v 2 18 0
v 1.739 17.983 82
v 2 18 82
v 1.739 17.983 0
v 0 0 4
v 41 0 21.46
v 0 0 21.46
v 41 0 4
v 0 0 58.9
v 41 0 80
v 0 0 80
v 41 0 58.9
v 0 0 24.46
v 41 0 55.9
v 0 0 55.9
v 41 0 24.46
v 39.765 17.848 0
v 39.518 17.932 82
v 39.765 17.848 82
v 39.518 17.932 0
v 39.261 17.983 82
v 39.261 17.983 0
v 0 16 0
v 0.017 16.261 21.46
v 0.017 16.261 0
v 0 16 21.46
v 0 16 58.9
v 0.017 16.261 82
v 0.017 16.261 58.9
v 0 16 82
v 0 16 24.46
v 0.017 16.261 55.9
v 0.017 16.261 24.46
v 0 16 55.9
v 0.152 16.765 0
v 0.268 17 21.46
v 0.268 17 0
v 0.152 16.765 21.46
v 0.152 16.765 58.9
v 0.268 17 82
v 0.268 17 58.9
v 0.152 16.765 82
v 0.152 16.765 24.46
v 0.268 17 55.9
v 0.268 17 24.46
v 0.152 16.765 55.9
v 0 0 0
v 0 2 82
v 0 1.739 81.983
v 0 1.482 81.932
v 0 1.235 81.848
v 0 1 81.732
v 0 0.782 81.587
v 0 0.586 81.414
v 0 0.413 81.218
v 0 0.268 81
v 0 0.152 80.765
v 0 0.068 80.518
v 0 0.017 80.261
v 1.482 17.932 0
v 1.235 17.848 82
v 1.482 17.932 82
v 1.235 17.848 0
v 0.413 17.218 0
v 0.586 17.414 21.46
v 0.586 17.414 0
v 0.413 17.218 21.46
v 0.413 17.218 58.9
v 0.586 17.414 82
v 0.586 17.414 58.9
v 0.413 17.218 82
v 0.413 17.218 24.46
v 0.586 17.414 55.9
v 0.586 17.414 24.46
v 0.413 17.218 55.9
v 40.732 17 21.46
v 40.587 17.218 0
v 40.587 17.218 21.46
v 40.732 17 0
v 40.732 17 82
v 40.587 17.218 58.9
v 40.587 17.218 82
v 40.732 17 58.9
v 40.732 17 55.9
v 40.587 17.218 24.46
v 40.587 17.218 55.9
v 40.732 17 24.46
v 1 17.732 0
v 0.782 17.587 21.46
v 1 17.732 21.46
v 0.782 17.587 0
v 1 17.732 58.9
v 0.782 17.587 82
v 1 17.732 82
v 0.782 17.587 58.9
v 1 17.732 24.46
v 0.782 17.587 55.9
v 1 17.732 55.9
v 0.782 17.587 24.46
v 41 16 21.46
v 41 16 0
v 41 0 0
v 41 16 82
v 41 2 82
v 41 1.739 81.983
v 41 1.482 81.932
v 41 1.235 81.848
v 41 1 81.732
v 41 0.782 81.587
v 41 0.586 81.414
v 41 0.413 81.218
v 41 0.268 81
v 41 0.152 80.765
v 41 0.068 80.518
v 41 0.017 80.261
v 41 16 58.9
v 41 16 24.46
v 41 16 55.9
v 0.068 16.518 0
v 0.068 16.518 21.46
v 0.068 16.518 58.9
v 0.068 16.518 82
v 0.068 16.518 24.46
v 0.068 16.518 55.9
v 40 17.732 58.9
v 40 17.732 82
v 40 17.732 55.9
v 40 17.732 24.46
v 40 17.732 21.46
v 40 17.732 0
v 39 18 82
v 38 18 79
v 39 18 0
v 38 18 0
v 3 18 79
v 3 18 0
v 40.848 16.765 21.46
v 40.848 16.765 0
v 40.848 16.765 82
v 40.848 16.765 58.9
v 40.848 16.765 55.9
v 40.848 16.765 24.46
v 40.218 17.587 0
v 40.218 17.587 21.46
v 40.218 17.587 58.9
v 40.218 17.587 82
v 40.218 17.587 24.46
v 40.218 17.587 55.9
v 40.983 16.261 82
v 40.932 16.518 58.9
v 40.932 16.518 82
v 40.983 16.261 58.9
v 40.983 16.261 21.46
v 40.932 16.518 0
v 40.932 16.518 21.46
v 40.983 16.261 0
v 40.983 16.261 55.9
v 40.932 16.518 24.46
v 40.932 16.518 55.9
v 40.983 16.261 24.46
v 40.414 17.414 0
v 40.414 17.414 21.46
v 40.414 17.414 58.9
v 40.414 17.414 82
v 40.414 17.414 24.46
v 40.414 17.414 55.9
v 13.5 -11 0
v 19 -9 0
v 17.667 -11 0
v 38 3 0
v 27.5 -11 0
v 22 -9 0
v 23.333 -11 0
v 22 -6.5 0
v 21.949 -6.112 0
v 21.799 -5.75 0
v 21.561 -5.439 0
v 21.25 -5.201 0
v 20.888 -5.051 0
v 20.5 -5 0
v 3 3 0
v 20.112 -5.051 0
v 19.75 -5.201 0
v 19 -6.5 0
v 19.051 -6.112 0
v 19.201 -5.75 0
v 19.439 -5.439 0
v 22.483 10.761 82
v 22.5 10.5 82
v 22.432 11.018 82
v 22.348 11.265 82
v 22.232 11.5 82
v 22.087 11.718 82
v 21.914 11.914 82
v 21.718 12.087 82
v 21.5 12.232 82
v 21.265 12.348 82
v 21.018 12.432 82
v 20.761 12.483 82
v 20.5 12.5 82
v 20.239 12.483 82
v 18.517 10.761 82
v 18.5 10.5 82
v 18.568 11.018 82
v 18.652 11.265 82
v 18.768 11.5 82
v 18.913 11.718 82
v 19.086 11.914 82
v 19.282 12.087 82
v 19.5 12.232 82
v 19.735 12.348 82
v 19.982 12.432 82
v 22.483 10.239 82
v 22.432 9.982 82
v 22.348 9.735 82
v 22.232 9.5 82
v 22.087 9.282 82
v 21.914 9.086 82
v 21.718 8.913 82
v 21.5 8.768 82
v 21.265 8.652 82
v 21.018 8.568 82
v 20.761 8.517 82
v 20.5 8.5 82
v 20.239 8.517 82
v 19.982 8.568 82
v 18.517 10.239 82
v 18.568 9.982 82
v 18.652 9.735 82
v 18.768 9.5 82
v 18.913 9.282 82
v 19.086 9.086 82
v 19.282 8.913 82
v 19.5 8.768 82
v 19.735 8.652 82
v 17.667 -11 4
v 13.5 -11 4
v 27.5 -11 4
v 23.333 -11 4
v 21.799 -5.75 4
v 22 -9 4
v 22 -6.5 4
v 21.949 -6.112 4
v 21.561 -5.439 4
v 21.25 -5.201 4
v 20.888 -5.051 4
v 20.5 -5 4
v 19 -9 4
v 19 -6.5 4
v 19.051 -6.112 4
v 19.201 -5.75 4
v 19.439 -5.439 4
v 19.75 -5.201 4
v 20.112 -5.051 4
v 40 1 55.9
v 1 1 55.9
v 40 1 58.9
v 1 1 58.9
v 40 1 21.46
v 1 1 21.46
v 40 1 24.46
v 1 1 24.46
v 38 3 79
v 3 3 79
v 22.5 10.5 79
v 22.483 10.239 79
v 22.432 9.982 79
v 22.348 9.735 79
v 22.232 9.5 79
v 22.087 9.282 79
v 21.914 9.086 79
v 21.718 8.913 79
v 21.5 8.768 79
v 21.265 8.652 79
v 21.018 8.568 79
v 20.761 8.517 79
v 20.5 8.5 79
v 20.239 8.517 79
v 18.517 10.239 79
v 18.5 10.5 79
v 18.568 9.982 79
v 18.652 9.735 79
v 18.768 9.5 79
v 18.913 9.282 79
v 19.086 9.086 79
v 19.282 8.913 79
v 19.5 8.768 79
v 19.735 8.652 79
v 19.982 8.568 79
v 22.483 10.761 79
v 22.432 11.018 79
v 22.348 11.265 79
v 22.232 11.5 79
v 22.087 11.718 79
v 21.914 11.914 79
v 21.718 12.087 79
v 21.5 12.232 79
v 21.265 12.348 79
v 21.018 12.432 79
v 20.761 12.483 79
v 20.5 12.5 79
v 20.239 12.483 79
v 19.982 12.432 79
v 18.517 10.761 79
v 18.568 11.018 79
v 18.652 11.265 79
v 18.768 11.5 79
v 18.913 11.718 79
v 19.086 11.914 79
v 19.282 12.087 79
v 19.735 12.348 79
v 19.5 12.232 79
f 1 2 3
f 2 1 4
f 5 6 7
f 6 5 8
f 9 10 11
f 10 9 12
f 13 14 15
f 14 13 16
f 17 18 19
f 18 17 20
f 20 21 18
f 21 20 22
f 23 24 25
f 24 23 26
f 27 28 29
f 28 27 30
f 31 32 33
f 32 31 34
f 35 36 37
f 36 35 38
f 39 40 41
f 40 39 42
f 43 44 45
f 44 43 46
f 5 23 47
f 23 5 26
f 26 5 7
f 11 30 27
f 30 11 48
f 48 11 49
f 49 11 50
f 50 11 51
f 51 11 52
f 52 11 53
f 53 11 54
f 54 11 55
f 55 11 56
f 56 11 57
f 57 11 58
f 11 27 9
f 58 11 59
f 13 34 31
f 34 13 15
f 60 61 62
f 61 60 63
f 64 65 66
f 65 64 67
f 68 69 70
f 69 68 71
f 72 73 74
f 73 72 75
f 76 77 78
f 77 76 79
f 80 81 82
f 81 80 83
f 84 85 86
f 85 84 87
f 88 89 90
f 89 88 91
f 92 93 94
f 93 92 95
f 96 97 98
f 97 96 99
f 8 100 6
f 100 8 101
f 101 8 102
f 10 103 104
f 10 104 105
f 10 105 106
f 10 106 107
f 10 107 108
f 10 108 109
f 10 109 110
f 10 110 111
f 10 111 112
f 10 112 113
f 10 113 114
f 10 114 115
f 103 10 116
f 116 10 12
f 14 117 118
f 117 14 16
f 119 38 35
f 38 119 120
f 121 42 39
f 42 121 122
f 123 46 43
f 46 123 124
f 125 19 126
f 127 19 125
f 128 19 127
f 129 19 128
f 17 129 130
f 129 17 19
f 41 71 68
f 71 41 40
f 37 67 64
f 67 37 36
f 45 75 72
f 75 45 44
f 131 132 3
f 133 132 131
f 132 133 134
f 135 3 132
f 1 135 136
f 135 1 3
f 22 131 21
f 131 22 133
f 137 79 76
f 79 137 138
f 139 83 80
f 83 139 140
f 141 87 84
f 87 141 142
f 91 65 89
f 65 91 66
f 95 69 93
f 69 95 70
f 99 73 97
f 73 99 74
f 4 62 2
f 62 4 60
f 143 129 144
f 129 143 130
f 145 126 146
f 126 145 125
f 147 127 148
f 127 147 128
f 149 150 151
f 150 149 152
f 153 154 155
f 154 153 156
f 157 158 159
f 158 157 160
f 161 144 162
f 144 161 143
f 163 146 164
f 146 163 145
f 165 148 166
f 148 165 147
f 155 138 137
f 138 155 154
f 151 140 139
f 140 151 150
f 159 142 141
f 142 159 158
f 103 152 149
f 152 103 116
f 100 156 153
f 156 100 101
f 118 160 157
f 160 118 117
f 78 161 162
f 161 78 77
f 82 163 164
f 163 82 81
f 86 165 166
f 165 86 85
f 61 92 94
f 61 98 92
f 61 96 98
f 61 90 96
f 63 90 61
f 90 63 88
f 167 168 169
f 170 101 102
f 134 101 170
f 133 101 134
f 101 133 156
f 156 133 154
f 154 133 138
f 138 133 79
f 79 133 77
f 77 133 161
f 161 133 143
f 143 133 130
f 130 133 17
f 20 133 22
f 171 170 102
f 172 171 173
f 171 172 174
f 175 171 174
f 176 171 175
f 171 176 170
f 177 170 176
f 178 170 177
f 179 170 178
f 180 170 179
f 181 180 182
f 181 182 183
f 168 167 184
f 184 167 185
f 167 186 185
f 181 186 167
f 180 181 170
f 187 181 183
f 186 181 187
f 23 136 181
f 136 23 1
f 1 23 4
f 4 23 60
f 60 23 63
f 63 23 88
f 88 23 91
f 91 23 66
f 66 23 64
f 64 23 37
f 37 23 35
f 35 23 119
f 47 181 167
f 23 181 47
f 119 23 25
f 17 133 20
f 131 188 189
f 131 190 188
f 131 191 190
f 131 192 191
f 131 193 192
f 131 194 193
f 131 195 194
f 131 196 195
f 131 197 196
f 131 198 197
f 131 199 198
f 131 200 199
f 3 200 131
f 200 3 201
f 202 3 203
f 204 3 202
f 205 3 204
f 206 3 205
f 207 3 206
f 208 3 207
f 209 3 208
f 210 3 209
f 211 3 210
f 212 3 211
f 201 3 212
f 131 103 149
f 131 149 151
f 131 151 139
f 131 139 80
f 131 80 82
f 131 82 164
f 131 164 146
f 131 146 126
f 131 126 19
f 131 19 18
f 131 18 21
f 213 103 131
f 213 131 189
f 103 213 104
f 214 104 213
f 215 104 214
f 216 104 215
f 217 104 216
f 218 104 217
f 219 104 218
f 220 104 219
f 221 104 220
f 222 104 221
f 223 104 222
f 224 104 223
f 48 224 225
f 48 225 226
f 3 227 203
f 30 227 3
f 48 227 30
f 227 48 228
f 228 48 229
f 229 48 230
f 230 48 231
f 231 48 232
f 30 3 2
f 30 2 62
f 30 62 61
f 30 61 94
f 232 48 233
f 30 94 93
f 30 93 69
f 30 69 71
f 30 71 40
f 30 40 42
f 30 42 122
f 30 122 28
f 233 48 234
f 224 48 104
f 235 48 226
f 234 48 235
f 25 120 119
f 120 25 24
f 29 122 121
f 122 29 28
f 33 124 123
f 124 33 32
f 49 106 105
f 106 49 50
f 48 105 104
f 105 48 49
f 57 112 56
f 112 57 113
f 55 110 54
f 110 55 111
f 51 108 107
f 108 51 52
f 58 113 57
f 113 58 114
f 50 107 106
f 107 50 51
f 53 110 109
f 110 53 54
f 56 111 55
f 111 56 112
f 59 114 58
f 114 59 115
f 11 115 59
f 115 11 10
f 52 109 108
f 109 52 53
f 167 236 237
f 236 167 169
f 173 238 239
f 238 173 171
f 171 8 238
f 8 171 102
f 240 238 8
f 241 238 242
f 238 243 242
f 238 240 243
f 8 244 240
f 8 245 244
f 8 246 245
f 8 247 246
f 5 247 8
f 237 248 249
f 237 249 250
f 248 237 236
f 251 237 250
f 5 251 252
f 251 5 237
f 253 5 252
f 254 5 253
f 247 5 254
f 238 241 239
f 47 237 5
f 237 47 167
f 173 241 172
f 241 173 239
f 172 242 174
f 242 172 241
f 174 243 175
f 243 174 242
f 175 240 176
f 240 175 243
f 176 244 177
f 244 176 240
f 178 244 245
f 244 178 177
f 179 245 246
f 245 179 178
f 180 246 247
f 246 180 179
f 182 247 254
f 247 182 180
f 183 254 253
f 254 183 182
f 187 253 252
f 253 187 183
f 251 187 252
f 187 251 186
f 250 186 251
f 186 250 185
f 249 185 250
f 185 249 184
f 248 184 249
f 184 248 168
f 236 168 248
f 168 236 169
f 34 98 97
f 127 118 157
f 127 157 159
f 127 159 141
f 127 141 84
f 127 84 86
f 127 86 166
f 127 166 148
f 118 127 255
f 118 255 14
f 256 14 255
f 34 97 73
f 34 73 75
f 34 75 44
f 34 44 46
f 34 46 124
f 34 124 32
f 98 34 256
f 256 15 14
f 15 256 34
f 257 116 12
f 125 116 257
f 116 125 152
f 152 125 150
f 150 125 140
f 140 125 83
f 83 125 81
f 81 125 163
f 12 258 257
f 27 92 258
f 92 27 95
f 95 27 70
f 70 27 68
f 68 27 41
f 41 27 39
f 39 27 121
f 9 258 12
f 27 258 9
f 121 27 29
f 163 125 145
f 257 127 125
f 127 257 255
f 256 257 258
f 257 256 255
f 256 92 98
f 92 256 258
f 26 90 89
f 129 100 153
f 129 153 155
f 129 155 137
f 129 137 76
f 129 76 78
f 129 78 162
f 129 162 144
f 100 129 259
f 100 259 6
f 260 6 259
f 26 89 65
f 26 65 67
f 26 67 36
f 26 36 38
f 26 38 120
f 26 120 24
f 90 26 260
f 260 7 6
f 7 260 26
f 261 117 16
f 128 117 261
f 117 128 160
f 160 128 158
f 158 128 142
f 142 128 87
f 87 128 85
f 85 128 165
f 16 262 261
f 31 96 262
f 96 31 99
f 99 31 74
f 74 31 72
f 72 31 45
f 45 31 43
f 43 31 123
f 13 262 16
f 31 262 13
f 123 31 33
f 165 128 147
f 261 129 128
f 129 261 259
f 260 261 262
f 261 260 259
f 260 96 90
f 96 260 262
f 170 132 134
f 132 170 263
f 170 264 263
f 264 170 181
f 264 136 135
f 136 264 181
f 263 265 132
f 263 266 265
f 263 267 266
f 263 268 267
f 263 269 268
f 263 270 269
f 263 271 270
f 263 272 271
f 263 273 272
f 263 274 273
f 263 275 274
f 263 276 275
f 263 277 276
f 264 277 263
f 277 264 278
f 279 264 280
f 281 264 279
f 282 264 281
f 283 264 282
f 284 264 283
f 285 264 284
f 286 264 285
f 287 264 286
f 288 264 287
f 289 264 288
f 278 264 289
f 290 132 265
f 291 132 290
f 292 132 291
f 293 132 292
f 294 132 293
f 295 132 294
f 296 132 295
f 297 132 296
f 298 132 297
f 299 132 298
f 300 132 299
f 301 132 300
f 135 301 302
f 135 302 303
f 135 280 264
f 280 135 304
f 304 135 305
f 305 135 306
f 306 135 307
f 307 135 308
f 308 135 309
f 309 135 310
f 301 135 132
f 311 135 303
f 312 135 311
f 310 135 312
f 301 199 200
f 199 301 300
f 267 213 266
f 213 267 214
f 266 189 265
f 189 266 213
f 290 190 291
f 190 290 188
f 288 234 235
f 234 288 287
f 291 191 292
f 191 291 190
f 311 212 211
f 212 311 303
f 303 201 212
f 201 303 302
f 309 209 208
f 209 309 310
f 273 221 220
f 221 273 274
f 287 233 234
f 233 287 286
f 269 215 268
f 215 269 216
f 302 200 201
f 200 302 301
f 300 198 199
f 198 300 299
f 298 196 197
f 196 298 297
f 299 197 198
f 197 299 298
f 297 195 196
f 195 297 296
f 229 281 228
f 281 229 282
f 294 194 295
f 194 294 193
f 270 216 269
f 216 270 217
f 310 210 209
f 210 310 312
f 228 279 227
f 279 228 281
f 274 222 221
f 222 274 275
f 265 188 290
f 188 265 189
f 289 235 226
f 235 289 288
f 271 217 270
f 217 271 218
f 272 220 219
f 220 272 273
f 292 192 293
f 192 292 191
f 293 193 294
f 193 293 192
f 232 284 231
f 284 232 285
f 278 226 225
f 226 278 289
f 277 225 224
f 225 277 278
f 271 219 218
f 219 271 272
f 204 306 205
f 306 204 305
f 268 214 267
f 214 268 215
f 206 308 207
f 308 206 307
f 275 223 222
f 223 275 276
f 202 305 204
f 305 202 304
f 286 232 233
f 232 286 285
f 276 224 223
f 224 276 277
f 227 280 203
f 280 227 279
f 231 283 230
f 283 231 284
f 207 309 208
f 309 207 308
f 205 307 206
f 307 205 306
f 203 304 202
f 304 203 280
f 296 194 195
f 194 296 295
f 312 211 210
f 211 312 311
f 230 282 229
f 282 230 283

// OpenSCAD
// SPDX-License-Identifier: CERN-OHL-S-2.0
// © 2026 WeSoar, conception Alexandre Pereira
// Source : https://github.com/wesoar-fr/ws-trimmer
// ============================================================
//  Support du télémètre laser, côté voile — reprise d'un premier essai, « TEST.stl ».
//
//  Même principe : le télémètre est couché dans une auge ouverte à l'avant ; sous l'avant,
//  un bec plat descend sous le fond et porte une encoche. La suspente passe dans l'encoche,
//  sa patte d'attache, trop grosse, bute contre le bec : sous 5 kg, la suspente reste dans
//  l'axe du faisceau. Lecture du laser + constante = longueur de la suspente.
//
//  Ce qui change par rapport à TEST.stl :
//   - cotes du télémètre en paramètres : largeur, longueur, épaisseur ;
//   - parois moins hautes que le télémètre (moins_epais), pour le saisir et atteindre ses boutons ;
//   - dégagement réglable dans une paroi pour les boutons placés sur le côté ;
//   - encoche de 3 mm, entrée en V, fond rond ; deux rainures pour un élastique, trou de dragonne.
//  Le bec garde strictement la forme de TEST.stl (4 mm, rien ne dépasse derrière lui).
//
//  TODO : origine de TEST.stl à confirmer par l'auteur : s'il vient d'un tiers, citer l'auteur
//  et vérifier la compatibilité de sa licence (voir NOTES.md, « Support du laser »).
//
//  Repère : y = sens du faisceau, face arrière du support en y = 0 ; z vers le haut, dessous
//  du fond en z = 0. Le bec est à l'avant (y = len), ses faces sont perpendiculaires au faisceau.
//  S'imprime debout sur la face avant du bec, sans support.
// ============================================================

// --- Télémètre : à mesurer au pied à coulisse (valeurs reprises de TEST.stl) ---
laser_w = 34.5;    // largeur
laser_l = 78.5;    // longueur
laser_h = 18;      // épaisseur
fit     = 0.5;     // jeu en largeur et en longueur
moins_epais = 3;   // les parois s'arrêtent à cette hauteur sous le dessus du télémètre

// --- Boutons sur le côté du télémètre : la paroi est abaissée en face d'eux ---
btn_cote = 0;      // 0 : aucun ; 1 : côté droit (x grand) ; -1 : côté gauche ; 2 : les deux
btn_y0   = 20;     // début du dégagement, depuis la face arrière du télémètre
btn_len  = 25;     // longueur du dégagement
btn_h    = 4;      // hauteur de paroi conservée sous le dégagement

// --- Auge ---
wall    = 3;       // parois
floor_t = 3;       // fond
r_ext   = 2;       // arrondi des arêtes du dessus et de l'arête arrière du dessous (comme TEST.stl)

// --- Bec et encoche (le bec reprend les 5 kg de la suspente) ---
bec_t    = 4;      // épaisseur du bec, comme sur TEST.stl
bec_drop = 11;     // descente du bec sous le fond
bec_bas  = 14;     // largeur du bec en bas
slit_w   = 3;      // largeur de l'encoche : la suspente passe, la patte (ou son nœud) non
slit_d   = 2.5;    // profondeur de la partie droite de l'encoche, au-dessus du V d'entrée
v_w      = 7;      // V d'entrée : largeur en bas…
v_d      = 2;      // …et profondeur

// --- Divers ---
elastique = true;  // deux rainures autour du support pour un élastique qui tient le télémètre
el_w = 3; el_d = 1;
el_pos = [0.3, 0.72];   // position des rainures, en fraction de la longueur
drag = 4;          // trou de dragonne dans la face arrière

// --- Valeurs dérivées ---
W      = laser_w + fit;
L      = laser_l + fit;
tray_w = W + 2*wall;
len    = wall + L;                     // face avant du bec = face avant du télémètre, au jeu près
wall_h = laser_h - moins_epais;
H      = floor_t + wall_h;
cx     = tray_w/2;                     // axe du faisceau et de l'encoche

$fn = 48;

module prism_y(y0, w) { translate([0, y0 + w, 0]) rotate([90, 0, 0]) linear_extrude(w) children(); }

module bec_profil() polygon([[0, 0], [tray_w, 0], [cx + bec_bas/2, -bec_drop], [cx - bec_bas/2, -bec_drop]]);

module encoche_profil() {
    zb = -bec_drop;
    polygon([[cx - v_w/2, zb - 1], [cx + v_w/2, zb - 1], [cx + slit_w/2, zb + v_d], [cx - slit_w/2, zb + v_d]]);
    translate([cx - slit_w/2, zb + v_d - 0.1]) square([slit_w, slit_d + 0.1]);
    translate([cx, zb + v_d + slit_d]) circle(d = slit_w, $fn = 24);
}

module bec() {
    difference() {
        prism_y(len - bec_t, bec_t) bec_profil();                                       // plaque
        prism_y(len - bec_t - 1, bec_t + 2) encoche_profil();                           // encoche
    }
}

// Bloc de l'auge, arrondi comme TEST.stl : les deux arêtes du dessus (le long du faisceau) et
// l'arête arrière du dessous. Les arêtes verticales restent vives, pour que le bec, qui prend
// toute la largeur, affleure les flancs sans lèvre.
module bloc() {
    intersection() {
        rotate([90, 0, 0]) translate([0, 0, -len]) linear_extrude(len) hull() {          // profil x-z : dessus arrondi
            square([tray_w, H - r_ext]);
            for (x = [r_ext, tray_w - r_ext]) translate([x, H - r_ext]) circle(r_ext);
        }
        rotate([90, 0, 90]) linear_extrude(tray_w) hull() {                              // profil y-z : arête arrière-dessous arrondie
            translate([r_ext, 0]) square([len - r_ext, H]);
            translate([0, r_ext]) square([len, H - r_ext]);
            translate([r_ext, r_ext]) circle(r_ext);
        }
    }
}

module support_laser() {
    difference() {
        union() {
            bloc();
            bec();
        }
        translate([wall, wall, floor_t]) cube([W, L + 1, H]);                                // logement, ouvert à l'avant
        // dégagement des boutons latéraux
        for (s = btn_cote == 2 ? [-1, 1] : btn_cote == 0 ? [] : [btn_cote])
            translate([s > 0 ? tray_w - wall - 1 : -1, wall + btn_y0, floor_t + btn_h]) cube([wall + 2, btn_len, H]);
        // trou de dragonne dans la face arrière
        translate([cx, -1, floor_t + wall_h/2]) rotate([-90, 0, 0]) cylinder(d = drag, h = wall + 2);
        // rainures pour l'élastique, autour des parois et du fond
        if (elastique) for (f = el_pos) translate([0, f*len - el_w/2, 0]) difference() {
            translate([-1, 0, -1]) cube([tray_w + 2, el_w, H + 2]);
            translate([el_d, -1, el_d]) cube([tray_w - 2*el_d, el_w + 2, H + 2]);
        }
    }
}

// orientation d'impression : debout sur la face avant du bec (la face qui regarde la cible)
translate([0, 0, len]) rotate([-90, 0, 0]) support_laser();
